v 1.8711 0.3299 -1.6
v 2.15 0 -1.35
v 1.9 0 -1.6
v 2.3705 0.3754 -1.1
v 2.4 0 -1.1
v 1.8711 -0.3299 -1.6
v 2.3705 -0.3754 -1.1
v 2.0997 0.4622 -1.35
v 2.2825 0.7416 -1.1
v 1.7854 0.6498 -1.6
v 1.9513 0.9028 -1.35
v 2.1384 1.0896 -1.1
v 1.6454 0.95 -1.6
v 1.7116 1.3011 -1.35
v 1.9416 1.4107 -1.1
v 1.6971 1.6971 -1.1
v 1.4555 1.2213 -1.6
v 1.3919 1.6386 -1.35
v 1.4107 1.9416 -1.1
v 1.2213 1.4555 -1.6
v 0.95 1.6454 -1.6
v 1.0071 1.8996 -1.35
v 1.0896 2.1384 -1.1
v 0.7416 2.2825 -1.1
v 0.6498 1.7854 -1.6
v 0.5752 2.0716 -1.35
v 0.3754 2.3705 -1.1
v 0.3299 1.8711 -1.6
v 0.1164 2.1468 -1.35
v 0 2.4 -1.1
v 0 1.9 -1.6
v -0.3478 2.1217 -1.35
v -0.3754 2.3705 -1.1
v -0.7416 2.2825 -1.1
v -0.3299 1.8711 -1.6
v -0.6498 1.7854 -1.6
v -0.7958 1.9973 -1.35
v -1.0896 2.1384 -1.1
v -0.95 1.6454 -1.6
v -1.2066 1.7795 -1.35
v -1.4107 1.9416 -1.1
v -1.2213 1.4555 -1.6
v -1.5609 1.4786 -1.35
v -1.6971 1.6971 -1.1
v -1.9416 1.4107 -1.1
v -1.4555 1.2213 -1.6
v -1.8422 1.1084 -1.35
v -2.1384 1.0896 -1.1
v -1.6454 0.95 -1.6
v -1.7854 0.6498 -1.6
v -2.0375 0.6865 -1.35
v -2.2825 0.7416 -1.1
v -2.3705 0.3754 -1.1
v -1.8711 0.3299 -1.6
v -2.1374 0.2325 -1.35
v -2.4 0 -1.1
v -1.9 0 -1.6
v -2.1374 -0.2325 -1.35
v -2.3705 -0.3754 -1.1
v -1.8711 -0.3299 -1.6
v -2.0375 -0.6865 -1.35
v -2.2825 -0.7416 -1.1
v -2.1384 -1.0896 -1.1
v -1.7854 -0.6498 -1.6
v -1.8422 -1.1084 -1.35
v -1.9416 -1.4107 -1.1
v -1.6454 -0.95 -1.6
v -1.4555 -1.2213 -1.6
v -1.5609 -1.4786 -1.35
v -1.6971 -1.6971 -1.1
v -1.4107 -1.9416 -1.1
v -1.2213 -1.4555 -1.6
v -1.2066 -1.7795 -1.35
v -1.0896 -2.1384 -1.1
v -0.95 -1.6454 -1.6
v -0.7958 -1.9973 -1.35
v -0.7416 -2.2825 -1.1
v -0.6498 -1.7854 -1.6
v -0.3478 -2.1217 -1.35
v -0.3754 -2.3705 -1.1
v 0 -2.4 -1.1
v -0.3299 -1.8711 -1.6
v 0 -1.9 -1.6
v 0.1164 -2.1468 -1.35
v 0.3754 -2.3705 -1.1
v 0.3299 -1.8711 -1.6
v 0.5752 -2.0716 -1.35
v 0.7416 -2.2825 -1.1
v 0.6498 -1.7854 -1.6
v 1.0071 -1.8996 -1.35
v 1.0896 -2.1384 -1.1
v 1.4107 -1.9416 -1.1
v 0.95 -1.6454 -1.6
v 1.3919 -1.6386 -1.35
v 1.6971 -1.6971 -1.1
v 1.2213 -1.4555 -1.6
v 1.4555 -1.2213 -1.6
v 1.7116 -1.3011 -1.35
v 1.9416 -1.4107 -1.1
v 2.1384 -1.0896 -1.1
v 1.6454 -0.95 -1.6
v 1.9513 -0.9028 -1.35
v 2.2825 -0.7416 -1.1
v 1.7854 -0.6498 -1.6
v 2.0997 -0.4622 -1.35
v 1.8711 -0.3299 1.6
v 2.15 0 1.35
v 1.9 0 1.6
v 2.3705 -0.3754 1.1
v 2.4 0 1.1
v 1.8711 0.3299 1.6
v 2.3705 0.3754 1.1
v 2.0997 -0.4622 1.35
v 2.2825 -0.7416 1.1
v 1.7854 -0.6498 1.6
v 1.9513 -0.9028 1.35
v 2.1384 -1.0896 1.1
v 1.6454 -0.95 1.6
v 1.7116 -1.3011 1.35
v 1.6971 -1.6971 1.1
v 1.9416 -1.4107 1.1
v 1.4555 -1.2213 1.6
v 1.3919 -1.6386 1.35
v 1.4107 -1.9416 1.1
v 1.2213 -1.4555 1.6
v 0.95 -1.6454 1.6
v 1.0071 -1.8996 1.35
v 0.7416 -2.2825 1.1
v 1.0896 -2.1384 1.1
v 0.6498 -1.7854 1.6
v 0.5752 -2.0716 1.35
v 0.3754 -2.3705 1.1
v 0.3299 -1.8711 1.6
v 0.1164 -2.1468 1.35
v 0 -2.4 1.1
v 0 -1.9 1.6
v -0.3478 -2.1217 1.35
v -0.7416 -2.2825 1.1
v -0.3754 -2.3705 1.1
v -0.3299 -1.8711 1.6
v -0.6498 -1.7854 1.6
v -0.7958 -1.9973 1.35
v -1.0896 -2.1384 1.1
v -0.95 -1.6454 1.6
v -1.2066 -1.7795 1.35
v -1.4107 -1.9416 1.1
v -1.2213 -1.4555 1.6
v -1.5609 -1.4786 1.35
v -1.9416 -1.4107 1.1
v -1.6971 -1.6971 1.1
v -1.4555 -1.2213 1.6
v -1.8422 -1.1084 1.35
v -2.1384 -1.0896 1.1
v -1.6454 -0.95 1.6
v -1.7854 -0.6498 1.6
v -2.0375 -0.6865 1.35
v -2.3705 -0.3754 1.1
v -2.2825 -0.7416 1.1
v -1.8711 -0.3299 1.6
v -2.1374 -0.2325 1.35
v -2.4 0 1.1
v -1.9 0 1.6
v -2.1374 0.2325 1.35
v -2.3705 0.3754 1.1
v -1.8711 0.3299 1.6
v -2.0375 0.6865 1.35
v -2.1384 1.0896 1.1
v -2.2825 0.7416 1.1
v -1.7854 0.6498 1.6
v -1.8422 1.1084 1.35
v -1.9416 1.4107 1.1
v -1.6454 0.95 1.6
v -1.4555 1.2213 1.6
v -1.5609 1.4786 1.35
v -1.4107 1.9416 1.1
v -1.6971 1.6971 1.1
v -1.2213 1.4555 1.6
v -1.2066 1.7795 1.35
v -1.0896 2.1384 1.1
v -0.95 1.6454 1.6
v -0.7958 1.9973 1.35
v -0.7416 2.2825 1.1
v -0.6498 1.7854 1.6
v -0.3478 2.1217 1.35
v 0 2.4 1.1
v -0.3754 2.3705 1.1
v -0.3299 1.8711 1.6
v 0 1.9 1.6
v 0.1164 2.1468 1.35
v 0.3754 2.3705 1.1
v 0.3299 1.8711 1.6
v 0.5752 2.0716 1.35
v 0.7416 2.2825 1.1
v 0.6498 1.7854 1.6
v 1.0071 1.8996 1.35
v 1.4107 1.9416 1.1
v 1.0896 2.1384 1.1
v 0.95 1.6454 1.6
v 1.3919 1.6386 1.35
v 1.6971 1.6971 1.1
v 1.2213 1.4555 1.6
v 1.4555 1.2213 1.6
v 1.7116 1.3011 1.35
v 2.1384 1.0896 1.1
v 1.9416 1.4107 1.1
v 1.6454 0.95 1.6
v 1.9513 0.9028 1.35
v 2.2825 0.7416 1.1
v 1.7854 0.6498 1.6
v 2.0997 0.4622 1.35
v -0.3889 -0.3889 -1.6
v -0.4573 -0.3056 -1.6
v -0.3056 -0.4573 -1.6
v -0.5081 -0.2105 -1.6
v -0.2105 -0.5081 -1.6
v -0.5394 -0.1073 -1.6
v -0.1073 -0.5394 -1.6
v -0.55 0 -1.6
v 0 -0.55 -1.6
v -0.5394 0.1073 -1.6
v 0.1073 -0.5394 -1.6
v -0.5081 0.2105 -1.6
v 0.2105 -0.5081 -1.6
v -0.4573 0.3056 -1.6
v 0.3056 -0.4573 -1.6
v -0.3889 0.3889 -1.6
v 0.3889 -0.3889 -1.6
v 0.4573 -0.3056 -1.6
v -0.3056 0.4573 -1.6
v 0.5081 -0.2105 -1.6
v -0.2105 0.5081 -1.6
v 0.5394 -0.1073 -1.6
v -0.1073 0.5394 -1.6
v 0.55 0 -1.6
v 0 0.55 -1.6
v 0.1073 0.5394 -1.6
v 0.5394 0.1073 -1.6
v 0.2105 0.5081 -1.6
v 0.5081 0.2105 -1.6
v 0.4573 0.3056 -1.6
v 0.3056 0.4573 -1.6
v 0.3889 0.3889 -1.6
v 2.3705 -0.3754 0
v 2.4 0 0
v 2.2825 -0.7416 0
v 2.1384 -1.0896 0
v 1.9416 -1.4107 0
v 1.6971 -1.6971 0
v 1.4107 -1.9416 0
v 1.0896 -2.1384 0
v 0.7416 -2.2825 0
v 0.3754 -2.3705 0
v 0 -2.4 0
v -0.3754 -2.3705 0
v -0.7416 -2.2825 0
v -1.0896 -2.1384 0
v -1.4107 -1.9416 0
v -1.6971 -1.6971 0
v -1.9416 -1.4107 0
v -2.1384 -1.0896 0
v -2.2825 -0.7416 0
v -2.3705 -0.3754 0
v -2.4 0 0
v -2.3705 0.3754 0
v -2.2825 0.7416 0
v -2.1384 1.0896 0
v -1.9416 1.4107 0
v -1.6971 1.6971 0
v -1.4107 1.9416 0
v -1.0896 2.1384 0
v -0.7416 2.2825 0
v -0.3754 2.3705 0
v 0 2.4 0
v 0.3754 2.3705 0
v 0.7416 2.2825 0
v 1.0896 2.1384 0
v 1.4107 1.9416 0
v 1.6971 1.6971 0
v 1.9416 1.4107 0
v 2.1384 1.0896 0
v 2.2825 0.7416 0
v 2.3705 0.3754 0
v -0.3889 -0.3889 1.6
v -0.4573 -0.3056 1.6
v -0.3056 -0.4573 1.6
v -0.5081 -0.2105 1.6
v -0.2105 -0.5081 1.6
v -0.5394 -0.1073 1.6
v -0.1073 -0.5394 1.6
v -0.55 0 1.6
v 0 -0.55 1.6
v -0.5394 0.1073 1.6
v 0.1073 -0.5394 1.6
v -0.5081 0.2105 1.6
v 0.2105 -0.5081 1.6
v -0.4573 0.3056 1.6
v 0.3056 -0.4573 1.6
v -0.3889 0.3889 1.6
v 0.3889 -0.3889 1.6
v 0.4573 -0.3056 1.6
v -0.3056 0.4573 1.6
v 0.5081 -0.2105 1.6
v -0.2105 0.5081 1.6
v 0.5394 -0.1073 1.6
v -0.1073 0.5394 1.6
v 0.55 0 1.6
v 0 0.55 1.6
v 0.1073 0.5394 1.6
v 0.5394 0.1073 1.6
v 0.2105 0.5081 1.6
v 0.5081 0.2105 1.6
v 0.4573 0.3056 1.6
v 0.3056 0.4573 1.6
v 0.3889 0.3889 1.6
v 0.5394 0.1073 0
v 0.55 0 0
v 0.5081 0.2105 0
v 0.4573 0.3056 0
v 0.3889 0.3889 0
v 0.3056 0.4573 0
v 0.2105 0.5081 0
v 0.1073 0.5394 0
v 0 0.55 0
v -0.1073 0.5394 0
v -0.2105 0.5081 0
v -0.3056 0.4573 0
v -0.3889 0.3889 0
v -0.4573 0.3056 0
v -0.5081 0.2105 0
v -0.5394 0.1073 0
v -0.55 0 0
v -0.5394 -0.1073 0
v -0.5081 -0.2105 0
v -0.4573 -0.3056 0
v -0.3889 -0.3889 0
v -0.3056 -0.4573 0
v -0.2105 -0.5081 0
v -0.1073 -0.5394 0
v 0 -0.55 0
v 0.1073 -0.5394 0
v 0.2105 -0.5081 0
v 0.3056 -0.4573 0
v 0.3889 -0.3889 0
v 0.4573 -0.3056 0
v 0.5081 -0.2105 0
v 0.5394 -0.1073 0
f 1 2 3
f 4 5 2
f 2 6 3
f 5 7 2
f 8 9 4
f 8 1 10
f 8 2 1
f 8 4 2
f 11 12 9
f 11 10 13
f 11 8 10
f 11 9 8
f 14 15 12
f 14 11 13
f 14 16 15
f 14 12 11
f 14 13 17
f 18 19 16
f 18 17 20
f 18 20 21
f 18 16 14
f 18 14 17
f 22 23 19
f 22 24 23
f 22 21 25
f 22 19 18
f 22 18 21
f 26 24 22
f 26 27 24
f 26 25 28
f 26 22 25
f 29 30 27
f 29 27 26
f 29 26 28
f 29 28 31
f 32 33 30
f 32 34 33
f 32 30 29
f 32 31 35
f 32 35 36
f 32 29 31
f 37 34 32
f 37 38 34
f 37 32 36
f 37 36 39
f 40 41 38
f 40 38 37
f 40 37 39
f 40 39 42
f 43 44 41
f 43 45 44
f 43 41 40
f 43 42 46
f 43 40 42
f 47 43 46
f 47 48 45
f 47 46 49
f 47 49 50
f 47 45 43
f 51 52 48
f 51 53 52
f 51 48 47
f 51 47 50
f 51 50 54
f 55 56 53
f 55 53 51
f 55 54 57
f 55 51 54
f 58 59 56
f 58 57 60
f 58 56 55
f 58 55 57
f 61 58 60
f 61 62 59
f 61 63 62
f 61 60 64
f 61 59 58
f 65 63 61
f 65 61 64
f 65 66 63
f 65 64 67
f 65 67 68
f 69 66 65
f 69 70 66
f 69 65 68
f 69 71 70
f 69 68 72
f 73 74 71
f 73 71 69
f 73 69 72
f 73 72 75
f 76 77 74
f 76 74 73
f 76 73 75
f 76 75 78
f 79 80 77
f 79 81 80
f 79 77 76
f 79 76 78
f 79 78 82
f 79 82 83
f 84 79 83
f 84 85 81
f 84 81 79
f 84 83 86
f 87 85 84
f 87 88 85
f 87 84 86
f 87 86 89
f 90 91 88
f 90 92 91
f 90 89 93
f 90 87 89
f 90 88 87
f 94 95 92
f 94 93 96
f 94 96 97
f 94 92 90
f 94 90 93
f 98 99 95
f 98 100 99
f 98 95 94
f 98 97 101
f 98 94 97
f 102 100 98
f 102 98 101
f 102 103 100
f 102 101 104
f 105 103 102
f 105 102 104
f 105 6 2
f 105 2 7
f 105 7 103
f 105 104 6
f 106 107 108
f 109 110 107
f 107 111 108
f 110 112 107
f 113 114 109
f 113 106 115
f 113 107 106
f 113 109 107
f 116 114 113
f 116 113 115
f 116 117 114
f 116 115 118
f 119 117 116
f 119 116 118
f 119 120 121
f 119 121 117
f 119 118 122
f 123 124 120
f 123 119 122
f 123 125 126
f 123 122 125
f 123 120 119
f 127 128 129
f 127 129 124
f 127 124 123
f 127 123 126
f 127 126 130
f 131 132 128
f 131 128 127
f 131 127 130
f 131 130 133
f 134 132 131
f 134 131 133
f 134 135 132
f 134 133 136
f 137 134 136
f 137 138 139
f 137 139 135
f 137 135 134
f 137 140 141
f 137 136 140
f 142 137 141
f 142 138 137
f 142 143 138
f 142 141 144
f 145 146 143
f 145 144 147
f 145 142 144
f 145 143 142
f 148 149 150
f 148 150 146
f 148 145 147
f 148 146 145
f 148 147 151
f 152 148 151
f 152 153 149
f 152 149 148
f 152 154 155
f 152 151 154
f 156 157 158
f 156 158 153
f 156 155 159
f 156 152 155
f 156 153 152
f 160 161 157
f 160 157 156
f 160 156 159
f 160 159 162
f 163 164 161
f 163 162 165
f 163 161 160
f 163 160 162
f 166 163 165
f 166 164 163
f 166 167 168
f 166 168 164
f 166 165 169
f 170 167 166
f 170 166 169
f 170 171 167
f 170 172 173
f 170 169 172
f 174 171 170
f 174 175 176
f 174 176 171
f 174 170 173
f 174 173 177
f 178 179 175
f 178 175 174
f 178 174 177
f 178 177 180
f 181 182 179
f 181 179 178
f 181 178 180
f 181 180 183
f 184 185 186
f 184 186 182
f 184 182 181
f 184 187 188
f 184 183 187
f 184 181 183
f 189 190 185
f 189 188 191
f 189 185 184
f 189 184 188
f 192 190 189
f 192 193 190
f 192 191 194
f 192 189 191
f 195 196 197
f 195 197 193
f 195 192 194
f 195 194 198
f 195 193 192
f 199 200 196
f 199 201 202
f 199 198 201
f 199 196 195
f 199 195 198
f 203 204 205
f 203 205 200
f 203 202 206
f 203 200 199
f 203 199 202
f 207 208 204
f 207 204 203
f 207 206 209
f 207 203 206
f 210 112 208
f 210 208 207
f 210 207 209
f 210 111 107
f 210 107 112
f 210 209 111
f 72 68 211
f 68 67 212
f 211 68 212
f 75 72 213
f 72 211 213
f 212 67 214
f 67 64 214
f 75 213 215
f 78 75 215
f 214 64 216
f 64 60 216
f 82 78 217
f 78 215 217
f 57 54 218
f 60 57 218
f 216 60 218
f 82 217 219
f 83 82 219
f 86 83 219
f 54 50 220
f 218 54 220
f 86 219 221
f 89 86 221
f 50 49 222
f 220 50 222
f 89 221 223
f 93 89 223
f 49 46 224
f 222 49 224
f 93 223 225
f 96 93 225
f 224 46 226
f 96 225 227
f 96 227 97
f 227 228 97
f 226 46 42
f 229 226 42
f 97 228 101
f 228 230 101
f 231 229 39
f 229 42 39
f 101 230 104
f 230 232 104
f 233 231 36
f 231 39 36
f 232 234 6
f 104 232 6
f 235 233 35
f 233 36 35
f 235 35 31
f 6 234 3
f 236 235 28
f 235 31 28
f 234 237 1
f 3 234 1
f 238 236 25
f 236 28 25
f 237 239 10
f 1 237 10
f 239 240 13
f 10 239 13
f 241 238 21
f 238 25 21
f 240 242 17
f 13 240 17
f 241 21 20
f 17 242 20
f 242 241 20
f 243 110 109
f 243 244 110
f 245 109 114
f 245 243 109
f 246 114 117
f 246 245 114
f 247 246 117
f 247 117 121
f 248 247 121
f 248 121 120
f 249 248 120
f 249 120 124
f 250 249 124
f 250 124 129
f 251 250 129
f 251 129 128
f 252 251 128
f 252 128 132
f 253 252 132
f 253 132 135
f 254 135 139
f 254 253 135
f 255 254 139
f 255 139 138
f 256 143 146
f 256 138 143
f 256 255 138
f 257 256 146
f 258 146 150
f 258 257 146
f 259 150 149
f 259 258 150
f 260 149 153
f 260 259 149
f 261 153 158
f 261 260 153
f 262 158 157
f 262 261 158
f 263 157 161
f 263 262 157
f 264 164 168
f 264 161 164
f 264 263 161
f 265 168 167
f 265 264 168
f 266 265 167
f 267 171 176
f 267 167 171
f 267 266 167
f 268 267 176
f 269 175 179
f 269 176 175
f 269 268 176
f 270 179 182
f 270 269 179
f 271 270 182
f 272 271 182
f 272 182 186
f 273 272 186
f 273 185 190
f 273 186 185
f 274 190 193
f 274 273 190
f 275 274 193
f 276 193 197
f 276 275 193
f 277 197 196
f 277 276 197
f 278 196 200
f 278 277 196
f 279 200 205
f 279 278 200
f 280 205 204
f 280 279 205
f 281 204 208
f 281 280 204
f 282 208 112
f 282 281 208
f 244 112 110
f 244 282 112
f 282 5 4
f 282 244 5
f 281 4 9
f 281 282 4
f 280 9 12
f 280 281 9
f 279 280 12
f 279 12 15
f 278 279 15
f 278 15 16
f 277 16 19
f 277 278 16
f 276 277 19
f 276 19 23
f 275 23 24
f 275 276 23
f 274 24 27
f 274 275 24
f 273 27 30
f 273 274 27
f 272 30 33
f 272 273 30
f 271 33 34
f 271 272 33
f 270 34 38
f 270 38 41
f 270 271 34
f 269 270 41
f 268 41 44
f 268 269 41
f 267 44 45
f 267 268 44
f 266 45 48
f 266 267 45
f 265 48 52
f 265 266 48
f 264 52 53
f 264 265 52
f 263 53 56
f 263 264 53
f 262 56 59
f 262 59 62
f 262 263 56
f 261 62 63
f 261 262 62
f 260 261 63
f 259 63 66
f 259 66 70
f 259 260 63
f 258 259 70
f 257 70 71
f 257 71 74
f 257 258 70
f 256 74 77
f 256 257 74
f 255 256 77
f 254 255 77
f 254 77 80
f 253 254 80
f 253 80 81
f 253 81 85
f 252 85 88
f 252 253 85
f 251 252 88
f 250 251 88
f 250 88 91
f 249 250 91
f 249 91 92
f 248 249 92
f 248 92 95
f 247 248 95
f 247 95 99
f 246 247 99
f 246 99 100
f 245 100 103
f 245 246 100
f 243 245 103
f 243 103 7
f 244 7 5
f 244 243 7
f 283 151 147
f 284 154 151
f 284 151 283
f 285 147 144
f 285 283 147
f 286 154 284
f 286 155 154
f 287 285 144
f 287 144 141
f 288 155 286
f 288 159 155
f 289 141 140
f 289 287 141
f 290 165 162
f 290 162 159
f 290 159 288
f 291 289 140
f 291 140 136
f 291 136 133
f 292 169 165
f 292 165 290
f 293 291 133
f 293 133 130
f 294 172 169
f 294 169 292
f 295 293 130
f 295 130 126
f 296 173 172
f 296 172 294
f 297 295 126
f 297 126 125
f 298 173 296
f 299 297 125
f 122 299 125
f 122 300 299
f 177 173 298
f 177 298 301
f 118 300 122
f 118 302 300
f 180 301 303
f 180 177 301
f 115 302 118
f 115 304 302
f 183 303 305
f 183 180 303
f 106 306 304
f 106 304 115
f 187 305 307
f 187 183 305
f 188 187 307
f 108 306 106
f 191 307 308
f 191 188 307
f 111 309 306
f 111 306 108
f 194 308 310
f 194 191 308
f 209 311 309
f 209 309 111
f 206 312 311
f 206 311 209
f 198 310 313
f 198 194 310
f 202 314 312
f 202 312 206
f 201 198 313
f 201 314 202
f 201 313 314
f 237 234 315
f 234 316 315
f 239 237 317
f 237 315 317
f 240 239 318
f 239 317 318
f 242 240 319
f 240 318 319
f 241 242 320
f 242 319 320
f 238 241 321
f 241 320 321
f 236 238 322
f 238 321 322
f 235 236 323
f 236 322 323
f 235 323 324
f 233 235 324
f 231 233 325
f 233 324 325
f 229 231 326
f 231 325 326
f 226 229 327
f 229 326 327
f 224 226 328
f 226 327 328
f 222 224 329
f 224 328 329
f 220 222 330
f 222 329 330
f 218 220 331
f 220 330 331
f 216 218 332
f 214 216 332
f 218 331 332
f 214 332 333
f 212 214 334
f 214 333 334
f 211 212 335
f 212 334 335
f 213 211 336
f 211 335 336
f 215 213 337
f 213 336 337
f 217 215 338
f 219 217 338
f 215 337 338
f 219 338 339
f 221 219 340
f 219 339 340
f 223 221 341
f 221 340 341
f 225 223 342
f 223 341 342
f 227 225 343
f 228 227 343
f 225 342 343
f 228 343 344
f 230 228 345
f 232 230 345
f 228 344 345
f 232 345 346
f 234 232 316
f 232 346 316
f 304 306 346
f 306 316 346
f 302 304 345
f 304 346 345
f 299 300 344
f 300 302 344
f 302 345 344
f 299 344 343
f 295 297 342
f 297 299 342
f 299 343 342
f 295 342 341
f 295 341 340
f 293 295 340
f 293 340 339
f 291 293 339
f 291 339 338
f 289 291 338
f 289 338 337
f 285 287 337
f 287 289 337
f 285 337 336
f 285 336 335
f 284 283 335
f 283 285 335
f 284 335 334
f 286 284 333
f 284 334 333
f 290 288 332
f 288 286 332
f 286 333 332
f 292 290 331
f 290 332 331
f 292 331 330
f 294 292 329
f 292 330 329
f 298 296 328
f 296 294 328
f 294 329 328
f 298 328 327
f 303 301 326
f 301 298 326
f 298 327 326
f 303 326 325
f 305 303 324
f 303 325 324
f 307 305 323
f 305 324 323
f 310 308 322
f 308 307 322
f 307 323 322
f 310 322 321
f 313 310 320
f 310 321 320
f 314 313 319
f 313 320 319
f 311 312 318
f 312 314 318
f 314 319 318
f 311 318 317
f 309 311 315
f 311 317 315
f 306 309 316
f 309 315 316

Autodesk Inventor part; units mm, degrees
ref_plane "YZ Plane" through (0, 0, 0) normal (1, 0, 0) x (0, 1, 0)
ref_plane "XZ Plane" through (0, 0, 0) normal (0, 1, 0) x (-1, 0, 0)
ref_plane "XY Plane" through (0, 0, 0) normal (0, 0, 1) x (1, 0, 0)
sketch "Sketch1" plane through (0, 0, 0) normal (0, 0, 1) x (1, 0, 0)
  circle A0 centre (0, 0) radius 2.4
  circle A1 centre (0, 0) radius 0.55
  dimension "d0" = 4.8
  dimension "d1" = 1.1
extrude "Extrusion1" add sketch "Sketch1" along normal mid plane 3.2
chamfer "Chamfer1" distance 0.5 angle 45 2 edges at (-2.4, 0, -1.6) (-2.4, 0, 1.6)
properties material "Acetal Resin, Black"
